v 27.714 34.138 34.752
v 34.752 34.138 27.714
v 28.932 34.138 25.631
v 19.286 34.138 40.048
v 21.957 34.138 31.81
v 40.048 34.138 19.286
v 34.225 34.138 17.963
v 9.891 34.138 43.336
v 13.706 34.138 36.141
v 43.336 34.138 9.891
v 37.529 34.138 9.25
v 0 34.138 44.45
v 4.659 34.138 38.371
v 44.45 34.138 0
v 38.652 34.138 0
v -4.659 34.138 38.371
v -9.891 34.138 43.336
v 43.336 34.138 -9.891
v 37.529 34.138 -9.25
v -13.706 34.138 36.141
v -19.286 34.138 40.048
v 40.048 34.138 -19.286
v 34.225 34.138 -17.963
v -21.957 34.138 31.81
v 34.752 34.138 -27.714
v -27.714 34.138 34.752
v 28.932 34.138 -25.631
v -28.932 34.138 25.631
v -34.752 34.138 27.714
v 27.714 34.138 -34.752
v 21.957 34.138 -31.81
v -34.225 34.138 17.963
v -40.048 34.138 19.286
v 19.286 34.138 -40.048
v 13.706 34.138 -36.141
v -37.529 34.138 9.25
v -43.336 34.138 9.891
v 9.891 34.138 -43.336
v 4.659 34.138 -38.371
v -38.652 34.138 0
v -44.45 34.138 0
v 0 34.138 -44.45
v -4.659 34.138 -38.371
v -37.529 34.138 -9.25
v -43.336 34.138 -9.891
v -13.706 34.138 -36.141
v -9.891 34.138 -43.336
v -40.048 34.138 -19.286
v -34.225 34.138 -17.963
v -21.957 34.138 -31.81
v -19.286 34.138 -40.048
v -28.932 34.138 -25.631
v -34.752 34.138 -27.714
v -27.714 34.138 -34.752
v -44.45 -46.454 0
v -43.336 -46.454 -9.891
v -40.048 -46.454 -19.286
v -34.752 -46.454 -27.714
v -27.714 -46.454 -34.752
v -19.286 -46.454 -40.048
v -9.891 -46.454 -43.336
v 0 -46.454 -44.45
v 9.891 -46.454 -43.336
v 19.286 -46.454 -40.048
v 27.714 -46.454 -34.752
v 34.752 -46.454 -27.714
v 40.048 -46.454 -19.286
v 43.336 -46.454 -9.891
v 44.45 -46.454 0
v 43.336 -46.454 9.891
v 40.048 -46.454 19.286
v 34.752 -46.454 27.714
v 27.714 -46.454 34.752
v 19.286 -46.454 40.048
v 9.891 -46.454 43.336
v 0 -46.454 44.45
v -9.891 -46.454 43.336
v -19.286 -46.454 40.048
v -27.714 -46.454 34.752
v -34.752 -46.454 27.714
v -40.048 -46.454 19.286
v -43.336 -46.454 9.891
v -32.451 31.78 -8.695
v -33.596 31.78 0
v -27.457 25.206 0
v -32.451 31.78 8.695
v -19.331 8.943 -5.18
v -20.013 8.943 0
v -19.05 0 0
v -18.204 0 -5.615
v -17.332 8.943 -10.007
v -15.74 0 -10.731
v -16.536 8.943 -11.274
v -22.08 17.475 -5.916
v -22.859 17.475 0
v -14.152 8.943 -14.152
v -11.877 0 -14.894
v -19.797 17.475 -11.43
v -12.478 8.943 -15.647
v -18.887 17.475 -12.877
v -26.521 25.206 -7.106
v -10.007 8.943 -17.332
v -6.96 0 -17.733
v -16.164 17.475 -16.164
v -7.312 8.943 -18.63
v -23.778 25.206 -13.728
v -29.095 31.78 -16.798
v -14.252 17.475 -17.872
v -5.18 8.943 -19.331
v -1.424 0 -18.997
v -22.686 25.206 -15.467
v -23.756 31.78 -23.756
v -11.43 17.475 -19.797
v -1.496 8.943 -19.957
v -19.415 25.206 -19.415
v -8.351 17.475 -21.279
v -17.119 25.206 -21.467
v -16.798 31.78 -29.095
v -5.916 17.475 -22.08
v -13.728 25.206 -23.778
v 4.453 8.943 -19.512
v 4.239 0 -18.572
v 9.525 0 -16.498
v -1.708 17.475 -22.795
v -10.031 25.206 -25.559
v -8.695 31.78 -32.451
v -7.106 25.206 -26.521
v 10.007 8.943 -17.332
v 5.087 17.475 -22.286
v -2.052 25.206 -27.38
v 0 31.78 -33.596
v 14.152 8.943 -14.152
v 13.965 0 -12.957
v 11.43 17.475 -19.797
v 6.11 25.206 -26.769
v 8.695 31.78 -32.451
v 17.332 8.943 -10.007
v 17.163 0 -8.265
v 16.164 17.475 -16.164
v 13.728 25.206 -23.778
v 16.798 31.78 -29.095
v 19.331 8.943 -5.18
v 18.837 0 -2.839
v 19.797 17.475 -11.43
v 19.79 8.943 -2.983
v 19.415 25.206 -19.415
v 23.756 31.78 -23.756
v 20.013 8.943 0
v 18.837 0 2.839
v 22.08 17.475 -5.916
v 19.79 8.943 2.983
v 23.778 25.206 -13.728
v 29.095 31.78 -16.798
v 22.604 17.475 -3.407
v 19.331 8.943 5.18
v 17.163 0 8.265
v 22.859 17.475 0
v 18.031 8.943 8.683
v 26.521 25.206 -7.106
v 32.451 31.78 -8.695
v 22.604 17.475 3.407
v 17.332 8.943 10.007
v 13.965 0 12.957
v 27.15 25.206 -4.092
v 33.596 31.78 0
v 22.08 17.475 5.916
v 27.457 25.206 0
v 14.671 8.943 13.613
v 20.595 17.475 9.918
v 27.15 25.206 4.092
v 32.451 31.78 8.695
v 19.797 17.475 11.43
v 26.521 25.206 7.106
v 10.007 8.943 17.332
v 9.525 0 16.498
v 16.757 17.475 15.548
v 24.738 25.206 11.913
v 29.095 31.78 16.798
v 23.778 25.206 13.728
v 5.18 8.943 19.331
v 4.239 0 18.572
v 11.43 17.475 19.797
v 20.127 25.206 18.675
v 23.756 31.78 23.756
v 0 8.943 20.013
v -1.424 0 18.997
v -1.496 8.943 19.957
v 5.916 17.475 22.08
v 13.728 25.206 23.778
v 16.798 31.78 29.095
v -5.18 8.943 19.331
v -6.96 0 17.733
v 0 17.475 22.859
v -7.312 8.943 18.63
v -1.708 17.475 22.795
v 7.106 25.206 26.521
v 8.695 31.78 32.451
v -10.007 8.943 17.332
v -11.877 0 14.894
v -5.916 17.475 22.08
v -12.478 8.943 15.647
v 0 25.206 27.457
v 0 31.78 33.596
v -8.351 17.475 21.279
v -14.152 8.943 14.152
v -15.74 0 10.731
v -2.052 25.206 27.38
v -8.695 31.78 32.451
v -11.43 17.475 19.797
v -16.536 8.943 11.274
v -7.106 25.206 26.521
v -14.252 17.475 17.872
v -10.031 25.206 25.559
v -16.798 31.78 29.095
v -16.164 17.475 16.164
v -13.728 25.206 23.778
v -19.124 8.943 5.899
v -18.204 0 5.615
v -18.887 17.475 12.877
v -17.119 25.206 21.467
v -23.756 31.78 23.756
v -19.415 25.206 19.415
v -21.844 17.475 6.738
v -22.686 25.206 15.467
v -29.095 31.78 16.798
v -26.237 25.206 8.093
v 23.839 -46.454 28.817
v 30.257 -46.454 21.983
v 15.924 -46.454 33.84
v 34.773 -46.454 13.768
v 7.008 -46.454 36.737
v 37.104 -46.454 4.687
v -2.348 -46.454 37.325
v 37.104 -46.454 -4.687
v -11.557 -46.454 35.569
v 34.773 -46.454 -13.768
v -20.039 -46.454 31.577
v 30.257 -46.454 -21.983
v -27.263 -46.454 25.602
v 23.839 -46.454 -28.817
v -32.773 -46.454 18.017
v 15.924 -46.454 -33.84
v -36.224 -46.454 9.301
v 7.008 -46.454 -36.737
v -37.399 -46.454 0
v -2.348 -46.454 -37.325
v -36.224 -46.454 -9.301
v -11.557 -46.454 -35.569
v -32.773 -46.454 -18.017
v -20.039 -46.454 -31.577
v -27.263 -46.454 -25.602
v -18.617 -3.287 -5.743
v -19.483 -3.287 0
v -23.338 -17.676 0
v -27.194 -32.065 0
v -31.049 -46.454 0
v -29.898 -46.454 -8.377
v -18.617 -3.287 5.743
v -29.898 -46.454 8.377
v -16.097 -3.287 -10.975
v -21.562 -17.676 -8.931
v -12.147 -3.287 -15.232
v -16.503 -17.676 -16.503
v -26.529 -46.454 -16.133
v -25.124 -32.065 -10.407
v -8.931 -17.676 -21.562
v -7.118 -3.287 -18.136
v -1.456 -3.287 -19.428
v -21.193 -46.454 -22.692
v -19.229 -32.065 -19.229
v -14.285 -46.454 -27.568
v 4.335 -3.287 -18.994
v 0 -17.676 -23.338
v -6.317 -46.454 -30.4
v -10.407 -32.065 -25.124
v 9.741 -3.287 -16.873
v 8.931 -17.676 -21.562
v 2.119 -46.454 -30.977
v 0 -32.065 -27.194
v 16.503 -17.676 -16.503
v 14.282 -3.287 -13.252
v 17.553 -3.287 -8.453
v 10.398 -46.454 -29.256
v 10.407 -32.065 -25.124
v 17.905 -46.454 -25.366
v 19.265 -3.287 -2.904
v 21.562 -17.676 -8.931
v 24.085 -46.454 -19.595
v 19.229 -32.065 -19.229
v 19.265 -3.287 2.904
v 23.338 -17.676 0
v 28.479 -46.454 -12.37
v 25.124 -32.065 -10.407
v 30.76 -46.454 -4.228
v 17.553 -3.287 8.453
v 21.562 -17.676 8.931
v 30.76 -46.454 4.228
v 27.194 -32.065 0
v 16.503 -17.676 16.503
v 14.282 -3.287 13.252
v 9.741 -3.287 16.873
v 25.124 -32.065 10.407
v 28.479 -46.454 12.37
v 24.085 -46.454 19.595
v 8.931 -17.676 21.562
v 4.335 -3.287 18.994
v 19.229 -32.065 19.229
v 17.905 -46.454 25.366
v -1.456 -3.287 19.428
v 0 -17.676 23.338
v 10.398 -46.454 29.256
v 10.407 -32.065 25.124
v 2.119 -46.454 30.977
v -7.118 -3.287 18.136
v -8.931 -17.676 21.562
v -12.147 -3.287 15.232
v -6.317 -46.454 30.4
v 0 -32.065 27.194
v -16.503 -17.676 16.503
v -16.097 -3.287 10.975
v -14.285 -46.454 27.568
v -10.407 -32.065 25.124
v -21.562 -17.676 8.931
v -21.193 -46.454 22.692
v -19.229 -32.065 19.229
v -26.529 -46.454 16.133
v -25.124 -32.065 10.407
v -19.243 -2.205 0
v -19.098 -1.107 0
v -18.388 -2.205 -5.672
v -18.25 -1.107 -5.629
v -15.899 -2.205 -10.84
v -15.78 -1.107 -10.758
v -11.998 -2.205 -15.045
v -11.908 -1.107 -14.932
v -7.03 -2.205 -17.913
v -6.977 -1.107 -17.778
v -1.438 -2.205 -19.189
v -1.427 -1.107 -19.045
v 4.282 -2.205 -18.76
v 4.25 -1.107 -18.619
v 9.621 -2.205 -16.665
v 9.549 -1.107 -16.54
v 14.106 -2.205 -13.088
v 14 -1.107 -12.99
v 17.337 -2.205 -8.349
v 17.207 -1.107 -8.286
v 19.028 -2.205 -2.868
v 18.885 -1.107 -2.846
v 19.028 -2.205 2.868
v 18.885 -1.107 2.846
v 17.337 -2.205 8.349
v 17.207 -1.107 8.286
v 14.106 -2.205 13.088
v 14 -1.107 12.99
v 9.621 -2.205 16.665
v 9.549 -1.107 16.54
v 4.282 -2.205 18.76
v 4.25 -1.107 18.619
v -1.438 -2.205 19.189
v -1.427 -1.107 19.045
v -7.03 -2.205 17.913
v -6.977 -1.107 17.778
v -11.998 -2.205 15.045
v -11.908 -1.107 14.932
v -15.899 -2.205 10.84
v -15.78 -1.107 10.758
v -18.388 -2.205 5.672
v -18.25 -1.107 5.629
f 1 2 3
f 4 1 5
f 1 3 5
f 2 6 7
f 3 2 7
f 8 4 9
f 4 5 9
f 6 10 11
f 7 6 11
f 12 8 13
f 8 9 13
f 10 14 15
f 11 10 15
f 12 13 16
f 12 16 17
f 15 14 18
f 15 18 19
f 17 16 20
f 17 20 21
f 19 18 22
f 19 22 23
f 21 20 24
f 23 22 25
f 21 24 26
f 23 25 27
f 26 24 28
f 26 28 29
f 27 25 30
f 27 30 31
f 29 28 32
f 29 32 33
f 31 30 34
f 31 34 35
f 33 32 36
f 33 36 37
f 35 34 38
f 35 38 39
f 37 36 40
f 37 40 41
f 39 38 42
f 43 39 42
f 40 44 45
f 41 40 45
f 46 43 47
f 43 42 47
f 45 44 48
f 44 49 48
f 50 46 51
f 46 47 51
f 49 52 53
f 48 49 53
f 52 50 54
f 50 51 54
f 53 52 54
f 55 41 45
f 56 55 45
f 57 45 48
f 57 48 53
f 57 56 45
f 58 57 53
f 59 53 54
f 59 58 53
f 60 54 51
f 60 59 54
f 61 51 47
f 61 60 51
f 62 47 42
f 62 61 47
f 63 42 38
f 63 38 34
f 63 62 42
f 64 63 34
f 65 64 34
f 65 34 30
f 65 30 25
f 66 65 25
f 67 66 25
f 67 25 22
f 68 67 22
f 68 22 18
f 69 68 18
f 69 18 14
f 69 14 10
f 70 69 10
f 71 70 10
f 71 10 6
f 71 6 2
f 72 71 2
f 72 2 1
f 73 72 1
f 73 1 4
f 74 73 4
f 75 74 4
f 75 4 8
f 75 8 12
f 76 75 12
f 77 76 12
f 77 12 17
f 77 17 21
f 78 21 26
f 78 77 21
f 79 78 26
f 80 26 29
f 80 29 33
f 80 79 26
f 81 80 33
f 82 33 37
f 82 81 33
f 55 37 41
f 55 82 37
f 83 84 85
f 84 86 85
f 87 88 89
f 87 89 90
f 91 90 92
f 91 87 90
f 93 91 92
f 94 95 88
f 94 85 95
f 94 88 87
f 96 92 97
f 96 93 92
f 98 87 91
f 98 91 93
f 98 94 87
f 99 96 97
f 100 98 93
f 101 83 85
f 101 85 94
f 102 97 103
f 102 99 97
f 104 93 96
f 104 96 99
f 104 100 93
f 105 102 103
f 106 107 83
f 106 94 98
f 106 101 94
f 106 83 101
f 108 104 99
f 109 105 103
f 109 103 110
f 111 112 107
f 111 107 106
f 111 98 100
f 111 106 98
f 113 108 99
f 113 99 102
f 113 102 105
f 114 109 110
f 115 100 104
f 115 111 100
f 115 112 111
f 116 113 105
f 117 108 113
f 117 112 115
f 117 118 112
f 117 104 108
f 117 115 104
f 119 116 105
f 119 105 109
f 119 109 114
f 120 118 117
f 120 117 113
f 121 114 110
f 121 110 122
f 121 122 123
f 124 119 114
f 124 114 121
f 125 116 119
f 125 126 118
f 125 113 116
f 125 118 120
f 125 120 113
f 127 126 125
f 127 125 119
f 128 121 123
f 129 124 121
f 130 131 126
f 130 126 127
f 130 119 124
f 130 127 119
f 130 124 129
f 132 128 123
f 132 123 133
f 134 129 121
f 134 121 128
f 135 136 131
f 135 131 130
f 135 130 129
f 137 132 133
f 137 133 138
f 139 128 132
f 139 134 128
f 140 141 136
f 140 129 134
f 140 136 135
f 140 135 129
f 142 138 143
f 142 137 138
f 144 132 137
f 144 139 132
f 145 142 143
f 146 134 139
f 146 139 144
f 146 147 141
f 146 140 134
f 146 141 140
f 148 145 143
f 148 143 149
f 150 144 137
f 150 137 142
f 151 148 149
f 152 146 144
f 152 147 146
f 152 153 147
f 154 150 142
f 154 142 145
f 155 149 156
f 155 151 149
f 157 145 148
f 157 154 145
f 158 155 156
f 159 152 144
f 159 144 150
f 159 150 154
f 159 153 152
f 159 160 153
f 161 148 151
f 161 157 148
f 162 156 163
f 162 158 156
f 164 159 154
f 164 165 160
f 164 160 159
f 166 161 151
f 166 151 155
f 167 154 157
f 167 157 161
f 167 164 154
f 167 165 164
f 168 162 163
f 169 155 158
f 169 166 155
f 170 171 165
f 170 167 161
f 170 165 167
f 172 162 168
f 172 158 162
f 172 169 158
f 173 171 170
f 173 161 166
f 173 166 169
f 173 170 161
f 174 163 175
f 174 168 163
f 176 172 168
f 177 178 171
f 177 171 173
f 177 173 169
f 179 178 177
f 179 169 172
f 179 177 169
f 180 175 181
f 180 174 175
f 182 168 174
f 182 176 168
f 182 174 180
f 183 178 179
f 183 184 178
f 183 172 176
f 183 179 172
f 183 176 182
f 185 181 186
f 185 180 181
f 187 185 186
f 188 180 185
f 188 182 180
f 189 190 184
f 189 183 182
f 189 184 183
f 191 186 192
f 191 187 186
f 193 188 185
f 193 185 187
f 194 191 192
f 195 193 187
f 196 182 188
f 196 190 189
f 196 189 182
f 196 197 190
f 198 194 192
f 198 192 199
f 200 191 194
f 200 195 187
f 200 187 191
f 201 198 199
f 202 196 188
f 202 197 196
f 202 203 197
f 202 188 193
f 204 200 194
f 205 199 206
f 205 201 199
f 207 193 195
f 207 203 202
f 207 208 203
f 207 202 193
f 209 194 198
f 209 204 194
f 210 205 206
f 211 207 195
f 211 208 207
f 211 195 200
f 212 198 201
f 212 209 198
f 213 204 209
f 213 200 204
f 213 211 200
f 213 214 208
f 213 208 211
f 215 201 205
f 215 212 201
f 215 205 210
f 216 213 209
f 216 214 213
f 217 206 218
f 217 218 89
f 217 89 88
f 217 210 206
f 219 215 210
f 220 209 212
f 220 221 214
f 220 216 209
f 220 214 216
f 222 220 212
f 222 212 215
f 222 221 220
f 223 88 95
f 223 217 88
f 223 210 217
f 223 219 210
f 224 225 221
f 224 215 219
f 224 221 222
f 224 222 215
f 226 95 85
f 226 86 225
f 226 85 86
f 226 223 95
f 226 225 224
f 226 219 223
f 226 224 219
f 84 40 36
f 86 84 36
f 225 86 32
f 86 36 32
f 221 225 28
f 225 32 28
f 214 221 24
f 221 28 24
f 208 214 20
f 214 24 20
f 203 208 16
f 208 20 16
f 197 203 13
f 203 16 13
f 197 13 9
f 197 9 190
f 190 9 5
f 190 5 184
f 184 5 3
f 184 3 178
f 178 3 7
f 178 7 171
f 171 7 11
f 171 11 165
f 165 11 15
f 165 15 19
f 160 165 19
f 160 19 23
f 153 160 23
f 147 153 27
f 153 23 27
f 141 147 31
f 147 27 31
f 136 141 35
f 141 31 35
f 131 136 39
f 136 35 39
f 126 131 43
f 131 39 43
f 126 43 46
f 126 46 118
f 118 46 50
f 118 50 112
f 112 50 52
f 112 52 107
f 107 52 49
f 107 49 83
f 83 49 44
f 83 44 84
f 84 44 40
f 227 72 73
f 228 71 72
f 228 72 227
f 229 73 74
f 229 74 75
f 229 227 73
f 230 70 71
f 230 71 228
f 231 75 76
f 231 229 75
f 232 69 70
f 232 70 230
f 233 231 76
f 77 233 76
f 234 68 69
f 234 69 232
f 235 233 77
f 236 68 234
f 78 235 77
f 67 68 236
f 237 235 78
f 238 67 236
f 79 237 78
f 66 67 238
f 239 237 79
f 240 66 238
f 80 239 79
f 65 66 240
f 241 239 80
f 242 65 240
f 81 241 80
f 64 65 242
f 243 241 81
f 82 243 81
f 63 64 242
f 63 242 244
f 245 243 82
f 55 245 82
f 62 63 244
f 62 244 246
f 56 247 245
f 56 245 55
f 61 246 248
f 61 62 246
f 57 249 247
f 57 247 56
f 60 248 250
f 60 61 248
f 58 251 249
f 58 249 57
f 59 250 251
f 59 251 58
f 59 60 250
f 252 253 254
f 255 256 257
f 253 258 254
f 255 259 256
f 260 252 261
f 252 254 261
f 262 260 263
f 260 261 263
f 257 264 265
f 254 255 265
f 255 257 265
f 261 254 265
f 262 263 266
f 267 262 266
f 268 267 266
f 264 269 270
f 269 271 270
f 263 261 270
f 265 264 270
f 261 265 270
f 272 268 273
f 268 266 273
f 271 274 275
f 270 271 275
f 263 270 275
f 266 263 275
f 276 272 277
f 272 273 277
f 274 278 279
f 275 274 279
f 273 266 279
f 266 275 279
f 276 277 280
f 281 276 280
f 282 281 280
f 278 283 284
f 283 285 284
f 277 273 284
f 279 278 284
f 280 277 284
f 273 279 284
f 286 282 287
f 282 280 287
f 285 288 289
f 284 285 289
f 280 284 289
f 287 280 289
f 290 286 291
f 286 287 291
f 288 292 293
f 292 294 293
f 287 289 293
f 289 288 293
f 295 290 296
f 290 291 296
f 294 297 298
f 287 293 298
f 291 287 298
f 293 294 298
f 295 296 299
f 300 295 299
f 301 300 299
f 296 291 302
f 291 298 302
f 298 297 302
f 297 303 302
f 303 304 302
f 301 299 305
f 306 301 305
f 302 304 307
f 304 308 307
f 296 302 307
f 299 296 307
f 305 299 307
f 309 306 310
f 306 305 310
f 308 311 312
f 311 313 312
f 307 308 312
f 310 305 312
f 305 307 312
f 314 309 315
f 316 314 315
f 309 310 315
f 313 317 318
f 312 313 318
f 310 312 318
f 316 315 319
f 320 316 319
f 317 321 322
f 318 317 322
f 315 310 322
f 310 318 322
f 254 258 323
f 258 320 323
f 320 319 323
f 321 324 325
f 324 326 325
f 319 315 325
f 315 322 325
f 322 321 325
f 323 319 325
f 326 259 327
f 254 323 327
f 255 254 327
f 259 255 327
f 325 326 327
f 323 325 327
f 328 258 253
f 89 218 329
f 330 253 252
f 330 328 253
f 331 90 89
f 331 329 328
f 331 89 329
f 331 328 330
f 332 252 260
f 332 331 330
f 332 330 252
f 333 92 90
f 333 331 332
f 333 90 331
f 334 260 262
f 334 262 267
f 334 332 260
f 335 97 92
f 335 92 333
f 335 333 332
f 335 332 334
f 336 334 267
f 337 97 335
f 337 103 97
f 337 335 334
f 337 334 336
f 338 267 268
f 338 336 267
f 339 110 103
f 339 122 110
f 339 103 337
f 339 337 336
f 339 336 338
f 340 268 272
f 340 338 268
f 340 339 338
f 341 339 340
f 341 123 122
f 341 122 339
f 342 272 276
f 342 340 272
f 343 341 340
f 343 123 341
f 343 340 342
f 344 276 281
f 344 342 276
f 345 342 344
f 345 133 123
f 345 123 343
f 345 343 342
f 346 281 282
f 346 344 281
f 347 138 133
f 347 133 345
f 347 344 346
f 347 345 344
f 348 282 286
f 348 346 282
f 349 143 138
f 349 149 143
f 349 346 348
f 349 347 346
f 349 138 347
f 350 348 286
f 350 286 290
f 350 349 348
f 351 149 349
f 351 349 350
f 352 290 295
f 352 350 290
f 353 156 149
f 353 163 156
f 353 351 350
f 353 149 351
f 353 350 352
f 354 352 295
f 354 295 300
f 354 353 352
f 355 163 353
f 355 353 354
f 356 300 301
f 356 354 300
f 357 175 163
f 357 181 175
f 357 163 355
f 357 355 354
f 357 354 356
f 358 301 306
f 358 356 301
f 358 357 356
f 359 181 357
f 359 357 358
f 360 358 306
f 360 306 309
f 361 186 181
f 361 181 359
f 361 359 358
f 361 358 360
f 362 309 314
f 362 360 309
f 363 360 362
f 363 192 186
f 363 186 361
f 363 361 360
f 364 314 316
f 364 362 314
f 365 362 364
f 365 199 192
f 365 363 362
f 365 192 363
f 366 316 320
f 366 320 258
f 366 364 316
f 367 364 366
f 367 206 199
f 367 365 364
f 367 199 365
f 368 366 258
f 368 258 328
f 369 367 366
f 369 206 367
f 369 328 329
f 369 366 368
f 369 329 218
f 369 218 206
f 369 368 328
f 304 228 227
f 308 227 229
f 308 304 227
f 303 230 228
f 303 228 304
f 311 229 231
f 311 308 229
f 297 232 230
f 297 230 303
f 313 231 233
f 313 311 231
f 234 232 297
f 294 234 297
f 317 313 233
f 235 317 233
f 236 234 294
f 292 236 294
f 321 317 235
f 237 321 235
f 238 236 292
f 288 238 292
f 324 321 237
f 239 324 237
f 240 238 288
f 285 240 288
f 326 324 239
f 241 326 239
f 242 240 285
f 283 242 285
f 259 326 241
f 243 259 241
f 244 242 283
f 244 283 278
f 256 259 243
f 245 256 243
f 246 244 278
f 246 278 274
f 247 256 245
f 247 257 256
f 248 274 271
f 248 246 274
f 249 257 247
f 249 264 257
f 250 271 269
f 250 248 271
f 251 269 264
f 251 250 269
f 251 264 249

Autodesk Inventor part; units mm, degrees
ref_plane "YZ Plane" through (0, 0, 0) normal (1, 0, 0) x (0, 1, 0)
ref_plane "XZ Plane" through (0, 0, 0) normal (0, 1, 0) x (-1, 0, 0)
ref_plane "XY Plane" through (0, 0, 0) normal (0, 0, 1) x (1, 0, 0)
sketch "Sketch1" plane through (0, 0, 0) normal (0, 0, 1) x (1, 0, 0)
  arc A0 (-19.4827, -3.287) -> (-19.05, 0) centre (-31.75, 0) ccw
  line L0 (-19.4827, -3.287) -> (-58.7375, -149.7878)
  line L1 (-65.8876, 46.8376) -> (-65.8876, 21.4376)
  line L2 (-65.8876, 21.4376) -> (-71.4375, 21.4376)
  line L3 (-44.45, 34.1376) -> (-38.6524, 34.1376)
  line L4 (-44.45, 34.1376) -> (0, 34.1376) construction
  line L5 (-37.3992, -46.4536) -> (-31.0492, -46.4536)
  line L6 (-71.4375, 21.4376) -> (-71.4375, 8.7376)
  line L7 (-71.4375, 8.7376) -> (-58.7375, 8.7376)
  line L8 (-58.7375, 8.7376) -> (-52.3875, 8.7376)
  line L9 (-52.3875, 8.7376) -> (-52.3875, -102.3907)
  line L10 (-71.4375, 8.7376) -> (-71.4375, -0.7874)
  line L11 (-71.4375, 8.7376) -> (-61.9125, 8.7376) construction
  line L12 (-71.4375, -0.7874) -> (-58.7375, -0.7874)
  line L13 (-58.7375, -0.7874) -> (-58.7375, -51.5874)
  line L14 (-58.7375, -51.5874) -> (-71.4375, -51.5874)
  line L15 (-71.4375, -0.7874) -> (-65.0875, -0.7874)
  line L16 (-65.0875, -0.7874) -> (-65.0875, -6.731)
  line L17 (-65.0875, -6.731) -> (-71.4375, -6.731)
  line L18 (-71.4375, 21.4376) -> (-71.4375, -0.7874)
  line L19 (-71.4375, -6.731) -> (-71.4375, -51.5874)
  line L20 (-58.7375, -51.5874) -> (-58.7375, -126.0892)
  line L21 (-58.7375, -51.5874) -> (0, -51.5874) construction
  line L22 (-46.0375, -102.3907) -> (-52.3875, -102.3907)
  line L23 (-65.0875, -51.5907) -> (-58.7375, -51.5907)
  line L24 (-58.7375, -149.7878) -> (-61.9125, -161.637)
  line L25 (-58.7375, -149.7878) -> (-34.203, -149.7878) construction
  line L26 (-65.0875, -161.637) -> (-61.9125, -161.637)
  line L27 (-58.7375, -126.0892) -> (-52.3875, -126.0892)
  line L28 (0, 34.1376) -> (0, 0)
  line L29 (-65.0875, -100.6892) -> (-65.0875, -161.637)
  line L30 (-58.7375, -51.5907) -> (-61.9125, -51.5907)
  line L31 (-65.0875, -100.6892) -> (-58.7375, -100.6892)
  line L32 (-65.8876, 46.8376) -> (-18.3062, 46.8376) construction
  line L33 (-65.8876, 46.8376) -> (-14.7047, 46.8376) construction
  line L34 (-65.8876, 46.8376) -> (-33.5957, 31.7796)
  line L35 (-65.8876, 46.8376) -> (-30.2574, 46.8376) construction
  arc A1 (-19.05, 0) -> (-33.5957, 31.7796) centre (-61.0391, 0) ccw
  line L36 (-44.45, 34.1376) -> (-44.45, -46.4536)
  line L37 (-44.45, 34.1376) -> (36.1412, 34.1376) construction
  line L38 (-44.45, -46.4536) -> (-37.3992, -46.4536)
  dimension "d56" = 19.05
  dimension "d57" = 25.4
  dimension "d58" = 5.5499
  dimension "d59" = 65.8876
  dimension "d60" = 12.7
  dimension "d61" = 12.7
  dimension "d62" = 44.45
  dimension "d63" = 6.35
  dimension "d64" = 105
  dimension "d65" = 12.7
  dimension "d66" = 12.7
  dimension "d67" = 6.35
  dimension "d68" = 9.525
  dimension "d69" = 50.8
  dimension "d70" = 12.7
  dimension "d71" = 6.35
  dimension "d72" = 5.9436
  dimension "d73" = 6.35
  dimension "d74" = 50.8
  dimension "d75" = 6.35
  dimension "d76" = 105
  dimension "d77" = 3.175
  dimension "d78" = 6.35
  dimension "d79" = 60.9478
  dimension "d80" = 3.175
  dimension "d81" = 6.35
  dimension "d82" = 25.4
  dimension "d83" = 25
  dimension "d84" = 41.9891
  dimension "d85" = 32.2919
  dimension "d86" = 90
  dimension "d87" = 80.5912
revolve "Revolution1" add sketch "Sketch1" angle 360 about axis through (0, 34.1376, 0) along (0, -1, 0) contours L0 L5 L38 L36 L3 L34 A1 A0
properties part number "Graphite" material "GFRC"
